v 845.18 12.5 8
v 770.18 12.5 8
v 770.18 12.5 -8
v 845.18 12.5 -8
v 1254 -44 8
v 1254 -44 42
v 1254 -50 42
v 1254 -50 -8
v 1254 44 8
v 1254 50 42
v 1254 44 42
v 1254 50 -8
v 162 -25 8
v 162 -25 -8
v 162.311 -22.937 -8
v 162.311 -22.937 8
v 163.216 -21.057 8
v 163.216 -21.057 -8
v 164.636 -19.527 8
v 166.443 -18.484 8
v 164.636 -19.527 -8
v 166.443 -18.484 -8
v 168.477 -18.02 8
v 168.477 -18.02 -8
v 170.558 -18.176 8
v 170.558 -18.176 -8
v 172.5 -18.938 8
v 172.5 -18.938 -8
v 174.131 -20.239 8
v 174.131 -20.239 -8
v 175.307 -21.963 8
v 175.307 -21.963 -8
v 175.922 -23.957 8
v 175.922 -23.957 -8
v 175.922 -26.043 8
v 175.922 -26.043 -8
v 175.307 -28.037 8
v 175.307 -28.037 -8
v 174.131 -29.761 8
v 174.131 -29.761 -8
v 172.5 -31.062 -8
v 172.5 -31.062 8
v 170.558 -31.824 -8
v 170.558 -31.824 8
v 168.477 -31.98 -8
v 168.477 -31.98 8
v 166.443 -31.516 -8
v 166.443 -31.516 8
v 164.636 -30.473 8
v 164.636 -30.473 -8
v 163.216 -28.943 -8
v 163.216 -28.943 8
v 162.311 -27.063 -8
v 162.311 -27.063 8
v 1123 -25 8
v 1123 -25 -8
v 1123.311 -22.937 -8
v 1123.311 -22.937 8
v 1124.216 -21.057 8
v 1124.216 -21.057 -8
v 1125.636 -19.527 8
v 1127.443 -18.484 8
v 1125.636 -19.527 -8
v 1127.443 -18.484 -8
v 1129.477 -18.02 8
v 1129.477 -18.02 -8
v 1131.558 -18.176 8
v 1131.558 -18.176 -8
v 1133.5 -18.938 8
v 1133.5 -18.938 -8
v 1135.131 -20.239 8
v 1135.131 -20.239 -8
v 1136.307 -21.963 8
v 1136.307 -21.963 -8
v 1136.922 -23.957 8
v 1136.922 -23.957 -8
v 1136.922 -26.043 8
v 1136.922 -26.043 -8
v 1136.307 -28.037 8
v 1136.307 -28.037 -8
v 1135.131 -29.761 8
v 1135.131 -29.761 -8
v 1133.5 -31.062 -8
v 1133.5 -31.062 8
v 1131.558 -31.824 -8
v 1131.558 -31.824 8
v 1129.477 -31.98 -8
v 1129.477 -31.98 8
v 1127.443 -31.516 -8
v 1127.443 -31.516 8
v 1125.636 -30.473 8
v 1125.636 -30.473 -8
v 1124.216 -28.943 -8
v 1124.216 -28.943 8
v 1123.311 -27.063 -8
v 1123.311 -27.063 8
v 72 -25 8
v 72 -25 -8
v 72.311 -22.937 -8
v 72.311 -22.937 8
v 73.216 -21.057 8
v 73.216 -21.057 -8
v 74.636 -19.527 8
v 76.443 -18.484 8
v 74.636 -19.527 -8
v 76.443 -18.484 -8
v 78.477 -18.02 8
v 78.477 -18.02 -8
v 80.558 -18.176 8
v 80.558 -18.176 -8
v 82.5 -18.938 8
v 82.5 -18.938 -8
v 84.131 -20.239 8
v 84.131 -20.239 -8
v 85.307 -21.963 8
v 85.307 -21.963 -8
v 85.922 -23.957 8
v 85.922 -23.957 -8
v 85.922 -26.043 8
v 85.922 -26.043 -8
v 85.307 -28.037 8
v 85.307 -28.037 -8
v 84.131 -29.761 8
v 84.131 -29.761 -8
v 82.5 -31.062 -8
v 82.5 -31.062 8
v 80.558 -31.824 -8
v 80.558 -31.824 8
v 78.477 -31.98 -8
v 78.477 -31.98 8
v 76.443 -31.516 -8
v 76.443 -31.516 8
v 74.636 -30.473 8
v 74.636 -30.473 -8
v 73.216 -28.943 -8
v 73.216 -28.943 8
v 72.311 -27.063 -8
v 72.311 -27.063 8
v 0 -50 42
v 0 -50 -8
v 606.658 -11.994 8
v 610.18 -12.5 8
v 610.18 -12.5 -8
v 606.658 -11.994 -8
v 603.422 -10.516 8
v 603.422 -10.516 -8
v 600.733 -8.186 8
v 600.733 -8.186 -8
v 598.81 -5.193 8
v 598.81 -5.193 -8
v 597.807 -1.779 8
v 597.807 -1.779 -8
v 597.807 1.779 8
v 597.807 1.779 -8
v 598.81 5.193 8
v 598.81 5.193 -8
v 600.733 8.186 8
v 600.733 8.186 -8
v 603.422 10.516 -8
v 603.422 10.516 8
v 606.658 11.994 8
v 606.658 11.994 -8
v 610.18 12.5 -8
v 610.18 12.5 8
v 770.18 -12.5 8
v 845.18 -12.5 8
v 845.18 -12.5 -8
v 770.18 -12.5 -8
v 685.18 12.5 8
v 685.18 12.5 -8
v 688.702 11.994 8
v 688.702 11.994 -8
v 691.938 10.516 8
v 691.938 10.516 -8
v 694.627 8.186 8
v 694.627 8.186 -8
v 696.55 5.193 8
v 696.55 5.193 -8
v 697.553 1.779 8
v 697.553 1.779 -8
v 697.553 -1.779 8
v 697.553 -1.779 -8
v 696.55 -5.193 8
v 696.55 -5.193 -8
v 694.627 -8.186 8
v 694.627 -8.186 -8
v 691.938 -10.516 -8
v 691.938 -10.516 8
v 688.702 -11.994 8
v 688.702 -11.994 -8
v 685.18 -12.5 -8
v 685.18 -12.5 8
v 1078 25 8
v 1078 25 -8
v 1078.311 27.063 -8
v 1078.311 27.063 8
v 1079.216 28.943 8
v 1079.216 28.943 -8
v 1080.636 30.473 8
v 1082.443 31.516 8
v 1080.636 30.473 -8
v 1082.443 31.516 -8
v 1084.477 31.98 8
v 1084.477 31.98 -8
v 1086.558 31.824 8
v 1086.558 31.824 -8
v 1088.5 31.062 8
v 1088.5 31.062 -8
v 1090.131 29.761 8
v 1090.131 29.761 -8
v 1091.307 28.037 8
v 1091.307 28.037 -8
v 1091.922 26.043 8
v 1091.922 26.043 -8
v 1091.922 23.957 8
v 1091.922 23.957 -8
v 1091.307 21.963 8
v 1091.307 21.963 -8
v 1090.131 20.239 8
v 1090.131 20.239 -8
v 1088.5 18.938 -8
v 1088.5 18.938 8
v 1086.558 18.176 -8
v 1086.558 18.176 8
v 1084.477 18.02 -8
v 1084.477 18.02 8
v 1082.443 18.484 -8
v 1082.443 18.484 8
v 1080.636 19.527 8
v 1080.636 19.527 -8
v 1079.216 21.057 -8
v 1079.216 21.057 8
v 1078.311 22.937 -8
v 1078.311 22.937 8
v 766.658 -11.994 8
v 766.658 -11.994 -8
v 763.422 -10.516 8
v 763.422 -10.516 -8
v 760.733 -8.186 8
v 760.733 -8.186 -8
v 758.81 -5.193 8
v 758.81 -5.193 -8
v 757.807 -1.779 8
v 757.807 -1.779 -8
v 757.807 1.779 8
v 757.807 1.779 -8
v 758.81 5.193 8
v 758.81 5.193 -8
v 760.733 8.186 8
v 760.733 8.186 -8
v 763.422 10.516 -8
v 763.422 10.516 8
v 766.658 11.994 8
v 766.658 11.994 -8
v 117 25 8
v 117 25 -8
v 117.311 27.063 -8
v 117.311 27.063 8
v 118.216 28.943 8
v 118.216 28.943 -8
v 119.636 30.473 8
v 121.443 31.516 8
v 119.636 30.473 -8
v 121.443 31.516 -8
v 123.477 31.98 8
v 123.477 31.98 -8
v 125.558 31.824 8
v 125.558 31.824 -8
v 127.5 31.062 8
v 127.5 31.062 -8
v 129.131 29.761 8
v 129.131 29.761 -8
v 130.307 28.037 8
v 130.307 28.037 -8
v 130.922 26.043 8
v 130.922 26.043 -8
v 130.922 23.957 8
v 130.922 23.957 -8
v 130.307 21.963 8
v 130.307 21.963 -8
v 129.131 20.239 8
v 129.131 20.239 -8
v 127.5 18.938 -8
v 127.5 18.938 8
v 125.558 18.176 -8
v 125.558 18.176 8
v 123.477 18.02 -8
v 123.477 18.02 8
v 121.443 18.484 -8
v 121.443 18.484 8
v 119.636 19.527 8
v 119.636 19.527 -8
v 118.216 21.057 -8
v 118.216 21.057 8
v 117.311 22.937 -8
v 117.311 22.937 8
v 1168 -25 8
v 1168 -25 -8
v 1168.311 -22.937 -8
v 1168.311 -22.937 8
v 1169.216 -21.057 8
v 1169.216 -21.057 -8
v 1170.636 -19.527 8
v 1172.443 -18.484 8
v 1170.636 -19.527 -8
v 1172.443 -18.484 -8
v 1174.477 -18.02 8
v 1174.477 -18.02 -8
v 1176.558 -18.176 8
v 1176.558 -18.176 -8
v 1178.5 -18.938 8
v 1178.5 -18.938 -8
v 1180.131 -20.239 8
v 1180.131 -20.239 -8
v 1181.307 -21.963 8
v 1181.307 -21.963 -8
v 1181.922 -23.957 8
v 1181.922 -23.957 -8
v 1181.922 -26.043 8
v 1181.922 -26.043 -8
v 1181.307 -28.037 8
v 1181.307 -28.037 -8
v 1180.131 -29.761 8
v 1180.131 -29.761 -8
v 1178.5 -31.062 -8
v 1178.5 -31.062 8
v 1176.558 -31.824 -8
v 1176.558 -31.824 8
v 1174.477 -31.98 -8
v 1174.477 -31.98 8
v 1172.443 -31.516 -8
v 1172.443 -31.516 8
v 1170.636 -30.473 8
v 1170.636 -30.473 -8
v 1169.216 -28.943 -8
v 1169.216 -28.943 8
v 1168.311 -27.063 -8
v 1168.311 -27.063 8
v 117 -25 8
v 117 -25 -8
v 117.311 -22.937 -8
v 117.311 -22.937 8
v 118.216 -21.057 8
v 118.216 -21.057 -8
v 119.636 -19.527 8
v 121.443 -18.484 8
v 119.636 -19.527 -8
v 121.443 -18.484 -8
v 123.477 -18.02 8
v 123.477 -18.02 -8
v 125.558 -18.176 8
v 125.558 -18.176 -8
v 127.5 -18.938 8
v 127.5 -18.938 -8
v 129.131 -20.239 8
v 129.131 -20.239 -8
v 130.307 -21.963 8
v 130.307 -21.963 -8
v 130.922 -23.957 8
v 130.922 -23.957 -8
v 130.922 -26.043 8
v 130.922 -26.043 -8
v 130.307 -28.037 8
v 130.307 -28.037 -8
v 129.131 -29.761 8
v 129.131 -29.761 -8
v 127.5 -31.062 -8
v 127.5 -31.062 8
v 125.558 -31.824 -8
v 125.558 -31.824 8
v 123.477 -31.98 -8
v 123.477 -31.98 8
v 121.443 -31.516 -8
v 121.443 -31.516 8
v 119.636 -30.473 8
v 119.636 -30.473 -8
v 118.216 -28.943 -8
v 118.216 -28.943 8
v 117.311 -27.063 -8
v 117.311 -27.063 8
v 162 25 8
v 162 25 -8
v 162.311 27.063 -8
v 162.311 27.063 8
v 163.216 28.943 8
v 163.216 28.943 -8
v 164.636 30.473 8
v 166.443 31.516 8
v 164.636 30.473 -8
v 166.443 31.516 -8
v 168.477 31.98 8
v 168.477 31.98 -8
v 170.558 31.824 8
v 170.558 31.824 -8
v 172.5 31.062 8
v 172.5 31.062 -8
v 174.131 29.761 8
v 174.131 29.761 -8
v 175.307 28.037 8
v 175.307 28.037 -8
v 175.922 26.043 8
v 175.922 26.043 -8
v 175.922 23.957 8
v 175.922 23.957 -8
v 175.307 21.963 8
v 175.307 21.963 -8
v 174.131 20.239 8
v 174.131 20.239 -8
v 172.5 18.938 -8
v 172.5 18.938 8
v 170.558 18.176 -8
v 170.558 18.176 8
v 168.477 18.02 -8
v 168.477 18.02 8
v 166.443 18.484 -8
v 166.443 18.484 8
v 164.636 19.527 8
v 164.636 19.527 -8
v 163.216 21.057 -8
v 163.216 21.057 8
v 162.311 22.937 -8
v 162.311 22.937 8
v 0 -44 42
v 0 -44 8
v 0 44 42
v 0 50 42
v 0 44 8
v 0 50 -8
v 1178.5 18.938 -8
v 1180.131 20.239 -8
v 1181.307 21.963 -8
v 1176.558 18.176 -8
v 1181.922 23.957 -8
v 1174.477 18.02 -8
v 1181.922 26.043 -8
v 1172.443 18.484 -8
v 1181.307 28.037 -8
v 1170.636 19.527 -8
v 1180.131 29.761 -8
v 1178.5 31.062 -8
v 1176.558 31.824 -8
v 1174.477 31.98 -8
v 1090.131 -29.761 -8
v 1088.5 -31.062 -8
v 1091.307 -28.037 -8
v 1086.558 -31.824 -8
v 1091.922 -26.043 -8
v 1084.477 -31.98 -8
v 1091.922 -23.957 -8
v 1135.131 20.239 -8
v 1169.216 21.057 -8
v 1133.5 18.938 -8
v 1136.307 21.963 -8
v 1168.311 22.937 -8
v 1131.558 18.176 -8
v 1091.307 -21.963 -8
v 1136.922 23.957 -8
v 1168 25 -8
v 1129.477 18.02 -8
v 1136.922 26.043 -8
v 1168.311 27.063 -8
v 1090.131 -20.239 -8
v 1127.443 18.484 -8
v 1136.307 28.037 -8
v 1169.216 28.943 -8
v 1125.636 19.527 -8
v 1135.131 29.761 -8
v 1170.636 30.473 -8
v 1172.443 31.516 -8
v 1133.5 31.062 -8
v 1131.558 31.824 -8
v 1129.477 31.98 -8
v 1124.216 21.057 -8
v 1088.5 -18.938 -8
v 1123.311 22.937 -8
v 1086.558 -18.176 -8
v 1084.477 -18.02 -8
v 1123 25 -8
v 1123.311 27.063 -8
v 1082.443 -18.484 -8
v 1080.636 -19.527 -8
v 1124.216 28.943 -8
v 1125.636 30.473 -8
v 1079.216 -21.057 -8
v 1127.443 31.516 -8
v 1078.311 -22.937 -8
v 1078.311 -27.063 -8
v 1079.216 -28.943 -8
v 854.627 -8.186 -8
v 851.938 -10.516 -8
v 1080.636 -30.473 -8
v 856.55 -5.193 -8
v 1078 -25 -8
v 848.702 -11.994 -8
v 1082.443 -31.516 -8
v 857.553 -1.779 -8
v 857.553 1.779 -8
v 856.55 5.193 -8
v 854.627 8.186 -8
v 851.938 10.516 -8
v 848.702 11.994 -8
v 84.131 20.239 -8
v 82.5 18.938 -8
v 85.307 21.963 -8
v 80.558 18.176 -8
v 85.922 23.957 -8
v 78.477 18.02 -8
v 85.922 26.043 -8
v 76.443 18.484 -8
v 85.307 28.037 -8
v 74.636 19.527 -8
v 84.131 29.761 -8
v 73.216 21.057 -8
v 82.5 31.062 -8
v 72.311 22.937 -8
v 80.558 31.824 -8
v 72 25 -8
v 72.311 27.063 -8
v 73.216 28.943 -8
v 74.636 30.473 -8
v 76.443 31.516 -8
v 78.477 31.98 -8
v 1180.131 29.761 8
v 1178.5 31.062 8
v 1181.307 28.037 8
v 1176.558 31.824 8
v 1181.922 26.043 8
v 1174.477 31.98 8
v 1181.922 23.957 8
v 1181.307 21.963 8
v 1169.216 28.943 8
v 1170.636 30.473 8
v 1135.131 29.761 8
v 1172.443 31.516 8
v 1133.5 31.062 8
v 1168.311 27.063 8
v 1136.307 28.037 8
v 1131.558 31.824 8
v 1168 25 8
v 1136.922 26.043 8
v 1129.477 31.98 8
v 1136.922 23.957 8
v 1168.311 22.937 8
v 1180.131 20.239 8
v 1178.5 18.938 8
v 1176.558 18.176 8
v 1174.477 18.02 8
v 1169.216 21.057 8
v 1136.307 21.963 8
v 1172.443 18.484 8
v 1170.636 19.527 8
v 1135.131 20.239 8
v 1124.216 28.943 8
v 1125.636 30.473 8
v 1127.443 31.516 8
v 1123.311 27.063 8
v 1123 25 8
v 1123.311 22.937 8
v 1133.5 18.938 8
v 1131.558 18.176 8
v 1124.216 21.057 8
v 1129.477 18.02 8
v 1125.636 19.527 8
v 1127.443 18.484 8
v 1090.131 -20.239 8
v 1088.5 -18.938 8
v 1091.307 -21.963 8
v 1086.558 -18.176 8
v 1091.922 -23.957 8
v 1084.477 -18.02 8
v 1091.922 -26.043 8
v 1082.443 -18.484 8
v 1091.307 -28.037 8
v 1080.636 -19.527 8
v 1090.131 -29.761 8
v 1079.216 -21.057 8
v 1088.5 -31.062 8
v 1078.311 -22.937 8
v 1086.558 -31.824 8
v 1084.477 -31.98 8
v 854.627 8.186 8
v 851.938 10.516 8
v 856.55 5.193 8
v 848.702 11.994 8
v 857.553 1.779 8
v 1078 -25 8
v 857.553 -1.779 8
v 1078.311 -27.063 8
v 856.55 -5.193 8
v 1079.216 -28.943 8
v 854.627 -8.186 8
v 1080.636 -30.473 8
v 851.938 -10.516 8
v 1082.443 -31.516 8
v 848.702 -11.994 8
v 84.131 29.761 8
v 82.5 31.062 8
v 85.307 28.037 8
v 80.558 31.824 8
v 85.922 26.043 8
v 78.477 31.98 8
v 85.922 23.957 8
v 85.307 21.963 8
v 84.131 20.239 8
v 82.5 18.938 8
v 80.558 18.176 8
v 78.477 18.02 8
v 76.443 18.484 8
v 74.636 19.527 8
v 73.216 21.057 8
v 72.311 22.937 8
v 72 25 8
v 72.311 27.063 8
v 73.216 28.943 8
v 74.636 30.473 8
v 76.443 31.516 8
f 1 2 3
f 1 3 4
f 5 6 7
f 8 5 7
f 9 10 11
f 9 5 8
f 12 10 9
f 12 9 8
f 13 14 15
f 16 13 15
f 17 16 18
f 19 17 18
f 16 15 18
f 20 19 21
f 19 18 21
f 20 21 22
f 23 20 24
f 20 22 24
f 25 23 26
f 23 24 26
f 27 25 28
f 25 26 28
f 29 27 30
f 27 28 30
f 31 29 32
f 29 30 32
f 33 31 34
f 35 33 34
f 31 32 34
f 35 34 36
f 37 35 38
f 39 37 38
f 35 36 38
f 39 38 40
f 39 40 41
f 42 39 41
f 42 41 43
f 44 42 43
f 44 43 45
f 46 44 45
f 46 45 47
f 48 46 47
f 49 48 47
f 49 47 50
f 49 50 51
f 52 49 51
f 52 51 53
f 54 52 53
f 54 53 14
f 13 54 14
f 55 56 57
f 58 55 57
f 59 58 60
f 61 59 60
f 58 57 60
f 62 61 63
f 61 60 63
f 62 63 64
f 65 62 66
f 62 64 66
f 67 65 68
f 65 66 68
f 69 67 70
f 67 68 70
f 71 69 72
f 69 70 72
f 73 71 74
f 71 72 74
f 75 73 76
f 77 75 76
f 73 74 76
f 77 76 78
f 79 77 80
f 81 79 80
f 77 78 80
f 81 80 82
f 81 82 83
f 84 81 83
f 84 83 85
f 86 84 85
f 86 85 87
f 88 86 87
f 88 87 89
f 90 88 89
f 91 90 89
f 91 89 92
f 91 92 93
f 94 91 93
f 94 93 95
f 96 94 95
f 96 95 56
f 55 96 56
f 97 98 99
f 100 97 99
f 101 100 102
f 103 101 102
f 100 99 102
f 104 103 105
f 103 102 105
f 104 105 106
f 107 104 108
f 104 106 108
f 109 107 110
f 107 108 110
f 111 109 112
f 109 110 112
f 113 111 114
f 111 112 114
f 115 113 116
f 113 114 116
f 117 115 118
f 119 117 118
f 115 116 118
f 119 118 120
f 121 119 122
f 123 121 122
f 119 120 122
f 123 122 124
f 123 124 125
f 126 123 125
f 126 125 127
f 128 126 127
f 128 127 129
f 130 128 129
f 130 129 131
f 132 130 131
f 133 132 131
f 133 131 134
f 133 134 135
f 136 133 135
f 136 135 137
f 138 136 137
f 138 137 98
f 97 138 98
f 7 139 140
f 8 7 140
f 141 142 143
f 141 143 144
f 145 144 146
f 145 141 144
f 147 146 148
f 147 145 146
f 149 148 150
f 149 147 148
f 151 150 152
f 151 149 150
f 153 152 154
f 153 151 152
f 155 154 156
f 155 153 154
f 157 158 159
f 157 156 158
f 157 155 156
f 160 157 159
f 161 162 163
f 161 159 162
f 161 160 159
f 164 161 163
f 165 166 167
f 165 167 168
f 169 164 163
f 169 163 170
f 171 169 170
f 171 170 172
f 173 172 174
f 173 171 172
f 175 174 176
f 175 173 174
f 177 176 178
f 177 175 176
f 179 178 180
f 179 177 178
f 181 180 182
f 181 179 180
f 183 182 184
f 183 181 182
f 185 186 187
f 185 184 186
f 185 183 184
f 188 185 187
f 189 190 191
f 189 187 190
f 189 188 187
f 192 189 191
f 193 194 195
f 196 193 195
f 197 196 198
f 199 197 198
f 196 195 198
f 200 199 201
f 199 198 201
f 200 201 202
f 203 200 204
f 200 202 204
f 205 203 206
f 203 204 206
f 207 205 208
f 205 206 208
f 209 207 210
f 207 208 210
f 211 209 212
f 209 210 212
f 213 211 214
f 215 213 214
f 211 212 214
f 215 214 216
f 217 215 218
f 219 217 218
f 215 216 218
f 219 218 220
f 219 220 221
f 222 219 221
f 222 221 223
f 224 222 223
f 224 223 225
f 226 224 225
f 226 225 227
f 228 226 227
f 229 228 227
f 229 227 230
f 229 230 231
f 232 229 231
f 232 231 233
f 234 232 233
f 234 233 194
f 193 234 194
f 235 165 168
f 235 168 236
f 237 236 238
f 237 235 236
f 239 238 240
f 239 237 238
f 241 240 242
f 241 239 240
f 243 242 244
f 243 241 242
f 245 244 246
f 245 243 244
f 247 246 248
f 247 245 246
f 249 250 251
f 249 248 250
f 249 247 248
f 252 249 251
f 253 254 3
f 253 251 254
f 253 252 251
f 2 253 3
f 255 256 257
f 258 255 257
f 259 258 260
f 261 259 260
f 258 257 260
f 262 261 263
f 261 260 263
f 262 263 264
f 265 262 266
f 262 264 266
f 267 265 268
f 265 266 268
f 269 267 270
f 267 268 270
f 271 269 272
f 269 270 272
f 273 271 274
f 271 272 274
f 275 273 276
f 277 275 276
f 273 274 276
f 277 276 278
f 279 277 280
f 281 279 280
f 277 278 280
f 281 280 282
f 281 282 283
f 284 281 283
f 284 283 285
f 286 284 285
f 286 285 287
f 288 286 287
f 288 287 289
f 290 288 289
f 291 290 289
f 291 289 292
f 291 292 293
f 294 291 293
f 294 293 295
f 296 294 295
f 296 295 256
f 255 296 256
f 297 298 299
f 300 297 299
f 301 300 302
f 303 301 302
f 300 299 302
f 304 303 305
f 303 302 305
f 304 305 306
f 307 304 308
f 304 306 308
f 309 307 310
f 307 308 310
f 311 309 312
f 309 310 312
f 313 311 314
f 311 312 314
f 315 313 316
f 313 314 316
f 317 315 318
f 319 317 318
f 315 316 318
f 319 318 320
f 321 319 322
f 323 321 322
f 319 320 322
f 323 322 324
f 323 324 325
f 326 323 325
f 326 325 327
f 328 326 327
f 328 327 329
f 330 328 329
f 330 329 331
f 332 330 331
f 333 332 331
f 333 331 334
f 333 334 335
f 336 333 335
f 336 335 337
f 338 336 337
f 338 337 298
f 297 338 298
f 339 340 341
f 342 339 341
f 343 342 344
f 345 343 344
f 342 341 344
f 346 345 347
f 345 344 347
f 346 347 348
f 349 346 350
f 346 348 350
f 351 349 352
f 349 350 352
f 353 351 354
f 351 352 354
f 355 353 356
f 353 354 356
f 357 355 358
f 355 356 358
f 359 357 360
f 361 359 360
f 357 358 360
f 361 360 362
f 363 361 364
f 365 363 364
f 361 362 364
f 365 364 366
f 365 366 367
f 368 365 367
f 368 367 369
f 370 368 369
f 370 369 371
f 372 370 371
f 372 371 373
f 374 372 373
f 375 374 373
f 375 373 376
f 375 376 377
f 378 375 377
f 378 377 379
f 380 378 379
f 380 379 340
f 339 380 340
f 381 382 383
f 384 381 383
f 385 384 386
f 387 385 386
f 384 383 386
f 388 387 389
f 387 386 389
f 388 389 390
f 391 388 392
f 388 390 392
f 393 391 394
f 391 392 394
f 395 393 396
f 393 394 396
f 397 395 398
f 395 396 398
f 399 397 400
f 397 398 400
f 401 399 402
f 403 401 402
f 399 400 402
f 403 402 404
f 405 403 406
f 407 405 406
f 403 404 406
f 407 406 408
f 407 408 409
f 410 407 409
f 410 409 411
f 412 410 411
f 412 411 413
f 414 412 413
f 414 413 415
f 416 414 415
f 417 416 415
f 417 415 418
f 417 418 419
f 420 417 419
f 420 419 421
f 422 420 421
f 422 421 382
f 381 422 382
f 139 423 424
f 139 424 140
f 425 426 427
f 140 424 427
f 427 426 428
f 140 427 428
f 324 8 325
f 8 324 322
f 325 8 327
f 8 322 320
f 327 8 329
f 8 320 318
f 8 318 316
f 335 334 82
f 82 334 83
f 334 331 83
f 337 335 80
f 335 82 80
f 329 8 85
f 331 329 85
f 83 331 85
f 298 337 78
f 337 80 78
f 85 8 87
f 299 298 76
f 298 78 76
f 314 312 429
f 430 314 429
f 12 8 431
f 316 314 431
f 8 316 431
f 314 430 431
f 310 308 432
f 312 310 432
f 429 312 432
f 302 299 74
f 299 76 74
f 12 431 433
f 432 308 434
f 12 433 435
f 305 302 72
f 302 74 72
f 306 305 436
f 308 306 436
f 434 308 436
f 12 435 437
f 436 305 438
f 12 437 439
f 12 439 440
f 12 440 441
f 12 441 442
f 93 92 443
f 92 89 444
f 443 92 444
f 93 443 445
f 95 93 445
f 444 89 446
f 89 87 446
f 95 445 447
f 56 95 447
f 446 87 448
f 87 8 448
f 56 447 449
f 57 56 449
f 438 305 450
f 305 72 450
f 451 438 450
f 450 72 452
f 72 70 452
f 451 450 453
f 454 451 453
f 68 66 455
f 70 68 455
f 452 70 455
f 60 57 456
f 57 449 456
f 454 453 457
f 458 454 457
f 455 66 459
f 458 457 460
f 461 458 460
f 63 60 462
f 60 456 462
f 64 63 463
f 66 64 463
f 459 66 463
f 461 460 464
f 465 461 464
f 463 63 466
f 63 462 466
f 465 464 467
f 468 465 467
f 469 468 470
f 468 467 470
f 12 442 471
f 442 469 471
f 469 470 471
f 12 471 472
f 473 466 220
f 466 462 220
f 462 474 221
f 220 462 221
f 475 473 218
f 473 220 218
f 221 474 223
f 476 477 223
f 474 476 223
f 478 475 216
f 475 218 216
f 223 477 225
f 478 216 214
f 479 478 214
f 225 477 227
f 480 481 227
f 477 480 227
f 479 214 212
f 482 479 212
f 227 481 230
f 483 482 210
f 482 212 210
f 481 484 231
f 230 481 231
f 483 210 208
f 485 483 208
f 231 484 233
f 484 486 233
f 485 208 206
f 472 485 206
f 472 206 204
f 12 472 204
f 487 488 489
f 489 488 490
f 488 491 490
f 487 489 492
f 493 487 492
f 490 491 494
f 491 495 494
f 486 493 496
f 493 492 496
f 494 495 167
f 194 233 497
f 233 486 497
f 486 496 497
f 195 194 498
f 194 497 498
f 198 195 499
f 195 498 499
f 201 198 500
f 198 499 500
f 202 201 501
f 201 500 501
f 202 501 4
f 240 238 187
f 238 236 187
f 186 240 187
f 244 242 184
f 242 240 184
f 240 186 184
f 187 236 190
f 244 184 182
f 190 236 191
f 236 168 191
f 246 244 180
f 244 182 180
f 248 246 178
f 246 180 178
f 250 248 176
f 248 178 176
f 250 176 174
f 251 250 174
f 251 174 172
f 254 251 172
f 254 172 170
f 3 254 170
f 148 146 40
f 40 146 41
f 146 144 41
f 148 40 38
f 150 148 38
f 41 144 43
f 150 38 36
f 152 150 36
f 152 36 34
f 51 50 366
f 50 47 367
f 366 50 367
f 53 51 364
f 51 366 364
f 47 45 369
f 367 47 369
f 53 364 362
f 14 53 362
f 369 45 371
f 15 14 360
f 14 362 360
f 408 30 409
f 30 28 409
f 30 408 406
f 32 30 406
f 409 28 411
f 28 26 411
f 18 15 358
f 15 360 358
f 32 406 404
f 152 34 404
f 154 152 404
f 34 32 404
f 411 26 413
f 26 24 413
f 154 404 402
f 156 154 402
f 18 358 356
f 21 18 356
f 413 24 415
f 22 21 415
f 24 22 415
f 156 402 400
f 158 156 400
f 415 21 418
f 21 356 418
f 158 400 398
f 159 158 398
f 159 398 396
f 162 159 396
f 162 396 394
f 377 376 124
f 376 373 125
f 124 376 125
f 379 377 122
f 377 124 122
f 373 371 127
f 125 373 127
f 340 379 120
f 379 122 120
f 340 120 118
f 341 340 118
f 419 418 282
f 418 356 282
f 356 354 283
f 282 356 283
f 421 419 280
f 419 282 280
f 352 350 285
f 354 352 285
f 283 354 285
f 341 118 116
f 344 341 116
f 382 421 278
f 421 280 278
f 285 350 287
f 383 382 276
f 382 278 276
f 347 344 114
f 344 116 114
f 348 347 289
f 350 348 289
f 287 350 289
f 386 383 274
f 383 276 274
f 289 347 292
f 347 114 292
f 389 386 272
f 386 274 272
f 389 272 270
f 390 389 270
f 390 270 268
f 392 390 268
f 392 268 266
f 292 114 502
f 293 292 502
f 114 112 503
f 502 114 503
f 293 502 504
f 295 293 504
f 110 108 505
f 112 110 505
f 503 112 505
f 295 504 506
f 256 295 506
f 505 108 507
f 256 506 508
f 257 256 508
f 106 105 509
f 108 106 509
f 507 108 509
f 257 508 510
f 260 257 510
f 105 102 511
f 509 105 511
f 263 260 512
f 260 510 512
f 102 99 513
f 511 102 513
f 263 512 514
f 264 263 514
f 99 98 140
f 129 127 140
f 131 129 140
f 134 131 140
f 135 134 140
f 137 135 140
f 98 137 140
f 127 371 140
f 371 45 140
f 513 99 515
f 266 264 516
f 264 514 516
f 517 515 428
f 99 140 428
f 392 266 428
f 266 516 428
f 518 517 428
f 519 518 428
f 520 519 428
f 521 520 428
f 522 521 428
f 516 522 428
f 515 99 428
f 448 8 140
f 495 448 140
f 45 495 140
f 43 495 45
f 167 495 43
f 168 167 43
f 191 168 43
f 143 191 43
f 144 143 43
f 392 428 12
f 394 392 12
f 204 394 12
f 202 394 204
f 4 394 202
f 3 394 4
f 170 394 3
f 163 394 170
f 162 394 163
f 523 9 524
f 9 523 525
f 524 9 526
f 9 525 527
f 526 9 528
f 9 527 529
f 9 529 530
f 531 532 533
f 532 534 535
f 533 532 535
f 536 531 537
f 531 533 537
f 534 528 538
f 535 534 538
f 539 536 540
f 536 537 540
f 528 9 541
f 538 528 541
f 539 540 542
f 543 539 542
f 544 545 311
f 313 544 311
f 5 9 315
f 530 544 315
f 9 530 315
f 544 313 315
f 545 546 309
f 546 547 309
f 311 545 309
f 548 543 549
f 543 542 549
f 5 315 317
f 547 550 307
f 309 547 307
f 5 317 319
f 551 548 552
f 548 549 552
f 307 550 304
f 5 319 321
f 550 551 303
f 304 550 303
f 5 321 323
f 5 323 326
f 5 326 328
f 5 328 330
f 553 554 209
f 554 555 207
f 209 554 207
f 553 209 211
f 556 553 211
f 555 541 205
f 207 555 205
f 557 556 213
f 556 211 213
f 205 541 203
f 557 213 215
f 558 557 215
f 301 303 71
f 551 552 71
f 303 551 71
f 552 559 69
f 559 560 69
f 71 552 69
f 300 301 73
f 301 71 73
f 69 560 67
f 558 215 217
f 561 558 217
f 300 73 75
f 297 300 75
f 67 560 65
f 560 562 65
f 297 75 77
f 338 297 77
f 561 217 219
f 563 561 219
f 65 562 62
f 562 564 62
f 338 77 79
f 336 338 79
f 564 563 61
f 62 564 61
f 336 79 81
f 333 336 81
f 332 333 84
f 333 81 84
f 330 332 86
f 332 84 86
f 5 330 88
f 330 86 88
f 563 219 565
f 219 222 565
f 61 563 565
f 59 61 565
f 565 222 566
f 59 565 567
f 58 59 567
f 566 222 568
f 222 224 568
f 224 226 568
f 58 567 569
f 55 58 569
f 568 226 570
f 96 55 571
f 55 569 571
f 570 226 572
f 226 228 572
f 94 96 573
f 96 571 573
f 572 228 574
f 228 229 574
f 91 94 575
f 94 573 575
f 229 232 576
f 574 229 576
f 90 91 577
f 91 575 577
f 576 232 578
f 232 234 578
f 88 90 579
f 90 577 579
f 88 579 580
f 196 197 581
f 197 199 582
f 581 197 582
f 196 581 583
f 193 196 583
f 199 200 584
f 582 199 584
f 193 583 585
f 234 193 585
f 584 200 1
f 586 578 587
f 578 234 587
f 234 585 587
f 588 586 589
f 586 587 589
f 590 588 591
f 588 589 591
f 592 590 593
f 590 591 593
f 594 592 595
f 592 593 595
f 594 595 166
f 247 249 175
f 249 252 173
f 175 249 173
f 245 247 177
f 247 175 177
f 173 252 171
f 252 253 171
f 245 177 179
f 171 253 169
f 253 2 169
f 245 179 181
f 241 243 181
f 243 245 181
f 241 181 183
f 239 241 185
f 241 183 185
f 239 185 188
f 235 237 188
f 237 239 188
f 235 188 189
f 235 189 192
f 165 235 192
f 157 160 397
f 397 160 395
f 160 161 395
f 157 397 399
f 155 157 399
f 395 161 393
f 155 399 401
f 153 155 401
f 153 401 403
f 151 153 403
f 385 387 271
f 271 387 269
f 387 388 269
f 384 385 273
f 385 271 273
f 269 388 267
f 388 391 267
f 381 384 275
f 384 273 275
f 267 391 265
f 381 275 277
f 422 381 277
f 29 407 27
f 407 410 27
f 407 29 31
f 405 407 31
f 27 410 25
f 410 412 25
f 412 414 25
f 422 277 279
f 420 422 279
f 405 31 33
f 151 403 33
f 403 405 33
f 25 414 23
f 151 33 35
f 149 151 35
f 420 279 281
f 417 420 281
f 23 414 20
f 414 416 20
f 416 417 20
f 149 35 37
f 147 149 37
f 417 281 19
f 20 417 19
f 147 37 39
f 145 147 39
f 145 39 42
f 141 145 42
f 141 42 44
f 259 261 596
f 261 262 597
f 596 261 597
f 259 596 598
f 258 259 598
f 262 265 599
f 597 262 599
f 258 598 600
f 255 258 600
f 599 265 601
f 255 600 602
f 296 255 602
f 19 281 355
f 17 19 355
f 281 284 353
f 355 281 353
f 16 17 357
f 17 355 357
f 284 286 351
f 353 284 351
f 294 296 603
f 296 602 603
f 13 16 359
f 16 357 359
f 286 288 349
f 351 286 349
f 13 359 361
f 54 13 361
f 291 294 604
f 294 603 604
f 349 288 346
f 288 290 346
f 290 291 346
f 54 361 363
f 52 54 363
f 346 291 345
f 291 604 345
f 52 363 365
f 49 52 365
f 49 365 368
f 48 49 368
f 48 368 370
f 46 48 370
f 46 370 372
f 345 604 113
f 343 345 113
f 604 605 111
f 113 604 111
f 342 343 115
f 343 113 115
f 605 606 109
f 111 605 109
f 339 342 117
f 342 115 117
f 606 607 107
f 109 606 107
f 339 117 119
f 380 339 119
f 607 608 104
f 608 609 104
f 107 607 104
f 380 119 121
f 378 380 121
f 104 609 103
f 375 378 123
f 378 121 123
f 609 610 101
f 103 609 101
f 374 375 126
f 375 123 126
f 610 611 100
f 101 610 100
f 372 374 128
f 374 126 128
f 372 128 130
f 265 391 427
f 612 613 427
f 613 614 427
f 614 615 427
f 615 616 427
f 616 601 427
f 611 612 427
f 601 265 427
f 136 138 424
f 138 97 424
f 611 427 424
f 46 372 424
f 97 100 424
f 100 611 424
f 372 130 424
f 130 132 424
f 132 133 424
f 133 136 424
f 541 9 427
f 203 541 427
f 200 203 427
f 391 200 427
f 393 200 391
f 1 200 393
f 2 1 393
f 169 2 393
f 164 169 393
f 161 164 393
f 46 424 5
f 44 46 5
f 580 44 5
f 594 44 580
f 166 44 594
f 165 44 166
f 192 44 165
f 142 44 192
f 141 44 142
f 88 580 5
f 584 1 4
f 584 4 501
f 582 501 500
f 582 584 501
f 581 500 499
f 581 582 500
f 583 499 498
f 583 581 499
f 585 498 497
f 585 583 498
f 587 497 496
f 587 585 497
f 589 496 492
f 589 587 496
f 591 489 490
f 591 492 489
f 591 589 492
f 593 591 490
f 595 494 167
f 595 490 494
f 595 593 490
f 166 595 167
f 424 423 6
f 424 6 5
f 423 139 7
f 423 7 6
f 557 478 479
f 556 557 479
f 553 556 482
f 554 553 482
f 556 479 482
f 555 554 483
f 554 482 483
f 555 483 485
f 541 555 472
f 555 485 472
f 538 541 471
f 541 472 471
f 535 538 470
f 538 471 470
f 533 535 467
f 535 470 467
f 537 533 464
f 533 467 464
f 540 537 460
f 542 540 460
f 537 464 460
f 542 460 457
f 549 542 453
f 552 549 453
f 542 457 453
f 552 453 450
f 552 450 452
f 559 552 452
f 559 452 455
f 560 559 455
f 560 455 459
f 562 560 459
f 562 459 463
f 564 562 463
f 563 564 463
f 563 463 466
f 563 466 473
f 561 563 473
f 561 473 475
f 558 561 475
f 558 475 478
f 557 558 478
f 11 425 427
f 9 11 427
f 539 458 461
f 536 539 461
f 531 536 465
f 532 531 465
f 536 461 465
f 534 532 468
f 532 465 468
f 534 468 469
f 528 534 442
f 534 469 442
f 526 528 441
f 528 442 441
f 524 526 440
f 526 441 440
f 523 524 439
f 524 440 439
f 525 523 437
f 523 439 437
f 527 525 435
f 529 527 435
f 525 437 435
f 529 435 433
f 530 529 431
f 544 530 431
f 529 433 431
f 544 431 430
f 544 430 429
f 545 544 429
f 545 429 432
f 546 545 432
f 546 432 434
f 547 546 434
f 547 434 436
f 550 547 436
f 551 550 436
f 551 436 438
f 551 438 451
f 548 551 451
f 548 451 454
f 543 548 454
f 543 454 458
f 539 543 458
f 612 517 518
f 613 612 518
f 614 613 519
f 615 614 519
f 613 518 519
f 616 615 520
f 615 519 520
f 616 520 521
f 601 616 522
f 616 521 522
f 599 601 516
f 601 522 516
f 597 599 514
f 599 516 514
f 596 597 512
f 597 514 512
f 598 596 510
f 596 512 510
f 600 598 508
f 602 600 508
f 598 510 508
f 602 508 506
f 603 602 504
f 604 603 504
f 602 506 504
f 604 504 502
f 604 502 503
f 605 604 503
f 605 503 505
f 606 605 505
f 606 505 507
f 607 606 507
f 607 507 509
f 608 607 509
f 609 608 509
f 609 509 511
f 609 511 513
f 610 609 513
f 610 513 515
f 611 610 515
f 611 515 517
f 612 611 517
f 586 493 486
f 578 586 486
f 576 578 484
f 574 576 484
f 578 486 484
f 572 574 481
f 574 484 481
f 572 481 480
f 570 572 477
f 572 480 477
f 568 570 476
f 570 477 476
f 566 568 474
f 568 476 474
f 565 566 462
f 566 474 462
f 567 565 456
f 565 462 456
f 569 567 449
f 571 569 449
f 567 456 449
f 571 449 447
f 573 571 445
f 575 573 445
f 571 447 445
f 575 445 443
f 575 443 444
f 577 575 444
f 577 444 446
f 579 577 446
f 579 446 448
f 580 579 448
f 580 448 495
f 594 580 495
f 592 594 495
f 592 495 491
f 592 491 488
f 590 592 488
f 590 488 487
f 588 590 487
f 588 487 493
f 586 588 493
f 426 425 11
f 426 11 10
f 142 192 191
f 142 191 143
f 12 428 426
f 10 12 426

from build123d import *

# Parameters (mm, degrees)
SKETCH1_W               = 34
SKETCH1_H               = 6
SKETCH1_W_2             = 16
SKETCH1_H_2             = 88
BOSS_EXTRUDE1_DEPTH     = 1254
F_12_0MM_DOWEL_HOLE1_D  = 14
CUT_EXTRUDE1_DEPTH      = 35
CUT_EXTRUDE1_DEPTH_BACK = 17


with BuildPart() as part:
    # Sketch1 → Boss-Extrude1 (new body)
    with BuildSketch(Plane(origin=(0, 0, 0), x_dir=(0, 0, -1), z_dir=(1, 0, 0))):
        with Locations((-25, 47)):
            Rectangle(SKETCH1_W, SKETCH1_H)
        with Locations((0, 47)):
            Rectangle(SKETCH1_W_2, SKETCH1_H)
        Rectangle(SKETCH1_W_2, SKETCH1_H_2)
        with Locations((0, -47)):
            Rectangle(SKETCH1_W_2, SKETCH1_H)
        with Locations((-25, -47)):
            Rectangle(SKETCH1_W, SKETCH1_H)
    extrude(amount=BOSS_EXTRUDE1_DEPTH)

    # Ø12.0mm Dowel Hole1 (through all)
    with Locations(Plane.XY.offset(8)):
        with Locations((1175, 25), (1130, 25), (1085, 25), (1085, -25), (1130, -25), (1175, -25), (79, 25), (124, 25), (169, 25), (169, -25), (124, -25), (79, -25)):
            Hole(F_12_0MM_DOWEL_HOLE1_D / 2)

    # Sketch7 → Cut-Extrude1 (cut, two sides)
    with BuildSketch(Plane.XY.offset(8)) as cut_extrude1_sk:
        with BuildLine():
            Line((770.18, 12.5), (845.18, 12.5))
            ThreePointArc((845.18, 12.5), (857.68, 0), (845.18, -12.5))
            Line((845.18, -12.5), (770.18, -12.5))
            ThreePointArc((770.18, -12.5), (757.68, 0), (770.18, 12.5))
        make_face()
        with BuildLine():
            Line((685.18, -12.5), (610.18, -12.5))
            ThreePointArc((610.18, -12.5), (597.68, 0), (610.18, 12.5))
            Line((610.18, 12.5), (685.18, 12.5))
            ThreePointArc((685.18, 12.5), (697.68, 0), (685.18, -12.5))
        make_face()
    extrude(amount=CUT_EXTRUDE1_DEPTH, mode=Mode.SUBTRACT)
    extrude(cut_extrude1_sk.sketch, amount=-CUT_EXTRUDE1_DEPTH_BACK, mode=Mode.SUBTRACT)


solid = part.part
